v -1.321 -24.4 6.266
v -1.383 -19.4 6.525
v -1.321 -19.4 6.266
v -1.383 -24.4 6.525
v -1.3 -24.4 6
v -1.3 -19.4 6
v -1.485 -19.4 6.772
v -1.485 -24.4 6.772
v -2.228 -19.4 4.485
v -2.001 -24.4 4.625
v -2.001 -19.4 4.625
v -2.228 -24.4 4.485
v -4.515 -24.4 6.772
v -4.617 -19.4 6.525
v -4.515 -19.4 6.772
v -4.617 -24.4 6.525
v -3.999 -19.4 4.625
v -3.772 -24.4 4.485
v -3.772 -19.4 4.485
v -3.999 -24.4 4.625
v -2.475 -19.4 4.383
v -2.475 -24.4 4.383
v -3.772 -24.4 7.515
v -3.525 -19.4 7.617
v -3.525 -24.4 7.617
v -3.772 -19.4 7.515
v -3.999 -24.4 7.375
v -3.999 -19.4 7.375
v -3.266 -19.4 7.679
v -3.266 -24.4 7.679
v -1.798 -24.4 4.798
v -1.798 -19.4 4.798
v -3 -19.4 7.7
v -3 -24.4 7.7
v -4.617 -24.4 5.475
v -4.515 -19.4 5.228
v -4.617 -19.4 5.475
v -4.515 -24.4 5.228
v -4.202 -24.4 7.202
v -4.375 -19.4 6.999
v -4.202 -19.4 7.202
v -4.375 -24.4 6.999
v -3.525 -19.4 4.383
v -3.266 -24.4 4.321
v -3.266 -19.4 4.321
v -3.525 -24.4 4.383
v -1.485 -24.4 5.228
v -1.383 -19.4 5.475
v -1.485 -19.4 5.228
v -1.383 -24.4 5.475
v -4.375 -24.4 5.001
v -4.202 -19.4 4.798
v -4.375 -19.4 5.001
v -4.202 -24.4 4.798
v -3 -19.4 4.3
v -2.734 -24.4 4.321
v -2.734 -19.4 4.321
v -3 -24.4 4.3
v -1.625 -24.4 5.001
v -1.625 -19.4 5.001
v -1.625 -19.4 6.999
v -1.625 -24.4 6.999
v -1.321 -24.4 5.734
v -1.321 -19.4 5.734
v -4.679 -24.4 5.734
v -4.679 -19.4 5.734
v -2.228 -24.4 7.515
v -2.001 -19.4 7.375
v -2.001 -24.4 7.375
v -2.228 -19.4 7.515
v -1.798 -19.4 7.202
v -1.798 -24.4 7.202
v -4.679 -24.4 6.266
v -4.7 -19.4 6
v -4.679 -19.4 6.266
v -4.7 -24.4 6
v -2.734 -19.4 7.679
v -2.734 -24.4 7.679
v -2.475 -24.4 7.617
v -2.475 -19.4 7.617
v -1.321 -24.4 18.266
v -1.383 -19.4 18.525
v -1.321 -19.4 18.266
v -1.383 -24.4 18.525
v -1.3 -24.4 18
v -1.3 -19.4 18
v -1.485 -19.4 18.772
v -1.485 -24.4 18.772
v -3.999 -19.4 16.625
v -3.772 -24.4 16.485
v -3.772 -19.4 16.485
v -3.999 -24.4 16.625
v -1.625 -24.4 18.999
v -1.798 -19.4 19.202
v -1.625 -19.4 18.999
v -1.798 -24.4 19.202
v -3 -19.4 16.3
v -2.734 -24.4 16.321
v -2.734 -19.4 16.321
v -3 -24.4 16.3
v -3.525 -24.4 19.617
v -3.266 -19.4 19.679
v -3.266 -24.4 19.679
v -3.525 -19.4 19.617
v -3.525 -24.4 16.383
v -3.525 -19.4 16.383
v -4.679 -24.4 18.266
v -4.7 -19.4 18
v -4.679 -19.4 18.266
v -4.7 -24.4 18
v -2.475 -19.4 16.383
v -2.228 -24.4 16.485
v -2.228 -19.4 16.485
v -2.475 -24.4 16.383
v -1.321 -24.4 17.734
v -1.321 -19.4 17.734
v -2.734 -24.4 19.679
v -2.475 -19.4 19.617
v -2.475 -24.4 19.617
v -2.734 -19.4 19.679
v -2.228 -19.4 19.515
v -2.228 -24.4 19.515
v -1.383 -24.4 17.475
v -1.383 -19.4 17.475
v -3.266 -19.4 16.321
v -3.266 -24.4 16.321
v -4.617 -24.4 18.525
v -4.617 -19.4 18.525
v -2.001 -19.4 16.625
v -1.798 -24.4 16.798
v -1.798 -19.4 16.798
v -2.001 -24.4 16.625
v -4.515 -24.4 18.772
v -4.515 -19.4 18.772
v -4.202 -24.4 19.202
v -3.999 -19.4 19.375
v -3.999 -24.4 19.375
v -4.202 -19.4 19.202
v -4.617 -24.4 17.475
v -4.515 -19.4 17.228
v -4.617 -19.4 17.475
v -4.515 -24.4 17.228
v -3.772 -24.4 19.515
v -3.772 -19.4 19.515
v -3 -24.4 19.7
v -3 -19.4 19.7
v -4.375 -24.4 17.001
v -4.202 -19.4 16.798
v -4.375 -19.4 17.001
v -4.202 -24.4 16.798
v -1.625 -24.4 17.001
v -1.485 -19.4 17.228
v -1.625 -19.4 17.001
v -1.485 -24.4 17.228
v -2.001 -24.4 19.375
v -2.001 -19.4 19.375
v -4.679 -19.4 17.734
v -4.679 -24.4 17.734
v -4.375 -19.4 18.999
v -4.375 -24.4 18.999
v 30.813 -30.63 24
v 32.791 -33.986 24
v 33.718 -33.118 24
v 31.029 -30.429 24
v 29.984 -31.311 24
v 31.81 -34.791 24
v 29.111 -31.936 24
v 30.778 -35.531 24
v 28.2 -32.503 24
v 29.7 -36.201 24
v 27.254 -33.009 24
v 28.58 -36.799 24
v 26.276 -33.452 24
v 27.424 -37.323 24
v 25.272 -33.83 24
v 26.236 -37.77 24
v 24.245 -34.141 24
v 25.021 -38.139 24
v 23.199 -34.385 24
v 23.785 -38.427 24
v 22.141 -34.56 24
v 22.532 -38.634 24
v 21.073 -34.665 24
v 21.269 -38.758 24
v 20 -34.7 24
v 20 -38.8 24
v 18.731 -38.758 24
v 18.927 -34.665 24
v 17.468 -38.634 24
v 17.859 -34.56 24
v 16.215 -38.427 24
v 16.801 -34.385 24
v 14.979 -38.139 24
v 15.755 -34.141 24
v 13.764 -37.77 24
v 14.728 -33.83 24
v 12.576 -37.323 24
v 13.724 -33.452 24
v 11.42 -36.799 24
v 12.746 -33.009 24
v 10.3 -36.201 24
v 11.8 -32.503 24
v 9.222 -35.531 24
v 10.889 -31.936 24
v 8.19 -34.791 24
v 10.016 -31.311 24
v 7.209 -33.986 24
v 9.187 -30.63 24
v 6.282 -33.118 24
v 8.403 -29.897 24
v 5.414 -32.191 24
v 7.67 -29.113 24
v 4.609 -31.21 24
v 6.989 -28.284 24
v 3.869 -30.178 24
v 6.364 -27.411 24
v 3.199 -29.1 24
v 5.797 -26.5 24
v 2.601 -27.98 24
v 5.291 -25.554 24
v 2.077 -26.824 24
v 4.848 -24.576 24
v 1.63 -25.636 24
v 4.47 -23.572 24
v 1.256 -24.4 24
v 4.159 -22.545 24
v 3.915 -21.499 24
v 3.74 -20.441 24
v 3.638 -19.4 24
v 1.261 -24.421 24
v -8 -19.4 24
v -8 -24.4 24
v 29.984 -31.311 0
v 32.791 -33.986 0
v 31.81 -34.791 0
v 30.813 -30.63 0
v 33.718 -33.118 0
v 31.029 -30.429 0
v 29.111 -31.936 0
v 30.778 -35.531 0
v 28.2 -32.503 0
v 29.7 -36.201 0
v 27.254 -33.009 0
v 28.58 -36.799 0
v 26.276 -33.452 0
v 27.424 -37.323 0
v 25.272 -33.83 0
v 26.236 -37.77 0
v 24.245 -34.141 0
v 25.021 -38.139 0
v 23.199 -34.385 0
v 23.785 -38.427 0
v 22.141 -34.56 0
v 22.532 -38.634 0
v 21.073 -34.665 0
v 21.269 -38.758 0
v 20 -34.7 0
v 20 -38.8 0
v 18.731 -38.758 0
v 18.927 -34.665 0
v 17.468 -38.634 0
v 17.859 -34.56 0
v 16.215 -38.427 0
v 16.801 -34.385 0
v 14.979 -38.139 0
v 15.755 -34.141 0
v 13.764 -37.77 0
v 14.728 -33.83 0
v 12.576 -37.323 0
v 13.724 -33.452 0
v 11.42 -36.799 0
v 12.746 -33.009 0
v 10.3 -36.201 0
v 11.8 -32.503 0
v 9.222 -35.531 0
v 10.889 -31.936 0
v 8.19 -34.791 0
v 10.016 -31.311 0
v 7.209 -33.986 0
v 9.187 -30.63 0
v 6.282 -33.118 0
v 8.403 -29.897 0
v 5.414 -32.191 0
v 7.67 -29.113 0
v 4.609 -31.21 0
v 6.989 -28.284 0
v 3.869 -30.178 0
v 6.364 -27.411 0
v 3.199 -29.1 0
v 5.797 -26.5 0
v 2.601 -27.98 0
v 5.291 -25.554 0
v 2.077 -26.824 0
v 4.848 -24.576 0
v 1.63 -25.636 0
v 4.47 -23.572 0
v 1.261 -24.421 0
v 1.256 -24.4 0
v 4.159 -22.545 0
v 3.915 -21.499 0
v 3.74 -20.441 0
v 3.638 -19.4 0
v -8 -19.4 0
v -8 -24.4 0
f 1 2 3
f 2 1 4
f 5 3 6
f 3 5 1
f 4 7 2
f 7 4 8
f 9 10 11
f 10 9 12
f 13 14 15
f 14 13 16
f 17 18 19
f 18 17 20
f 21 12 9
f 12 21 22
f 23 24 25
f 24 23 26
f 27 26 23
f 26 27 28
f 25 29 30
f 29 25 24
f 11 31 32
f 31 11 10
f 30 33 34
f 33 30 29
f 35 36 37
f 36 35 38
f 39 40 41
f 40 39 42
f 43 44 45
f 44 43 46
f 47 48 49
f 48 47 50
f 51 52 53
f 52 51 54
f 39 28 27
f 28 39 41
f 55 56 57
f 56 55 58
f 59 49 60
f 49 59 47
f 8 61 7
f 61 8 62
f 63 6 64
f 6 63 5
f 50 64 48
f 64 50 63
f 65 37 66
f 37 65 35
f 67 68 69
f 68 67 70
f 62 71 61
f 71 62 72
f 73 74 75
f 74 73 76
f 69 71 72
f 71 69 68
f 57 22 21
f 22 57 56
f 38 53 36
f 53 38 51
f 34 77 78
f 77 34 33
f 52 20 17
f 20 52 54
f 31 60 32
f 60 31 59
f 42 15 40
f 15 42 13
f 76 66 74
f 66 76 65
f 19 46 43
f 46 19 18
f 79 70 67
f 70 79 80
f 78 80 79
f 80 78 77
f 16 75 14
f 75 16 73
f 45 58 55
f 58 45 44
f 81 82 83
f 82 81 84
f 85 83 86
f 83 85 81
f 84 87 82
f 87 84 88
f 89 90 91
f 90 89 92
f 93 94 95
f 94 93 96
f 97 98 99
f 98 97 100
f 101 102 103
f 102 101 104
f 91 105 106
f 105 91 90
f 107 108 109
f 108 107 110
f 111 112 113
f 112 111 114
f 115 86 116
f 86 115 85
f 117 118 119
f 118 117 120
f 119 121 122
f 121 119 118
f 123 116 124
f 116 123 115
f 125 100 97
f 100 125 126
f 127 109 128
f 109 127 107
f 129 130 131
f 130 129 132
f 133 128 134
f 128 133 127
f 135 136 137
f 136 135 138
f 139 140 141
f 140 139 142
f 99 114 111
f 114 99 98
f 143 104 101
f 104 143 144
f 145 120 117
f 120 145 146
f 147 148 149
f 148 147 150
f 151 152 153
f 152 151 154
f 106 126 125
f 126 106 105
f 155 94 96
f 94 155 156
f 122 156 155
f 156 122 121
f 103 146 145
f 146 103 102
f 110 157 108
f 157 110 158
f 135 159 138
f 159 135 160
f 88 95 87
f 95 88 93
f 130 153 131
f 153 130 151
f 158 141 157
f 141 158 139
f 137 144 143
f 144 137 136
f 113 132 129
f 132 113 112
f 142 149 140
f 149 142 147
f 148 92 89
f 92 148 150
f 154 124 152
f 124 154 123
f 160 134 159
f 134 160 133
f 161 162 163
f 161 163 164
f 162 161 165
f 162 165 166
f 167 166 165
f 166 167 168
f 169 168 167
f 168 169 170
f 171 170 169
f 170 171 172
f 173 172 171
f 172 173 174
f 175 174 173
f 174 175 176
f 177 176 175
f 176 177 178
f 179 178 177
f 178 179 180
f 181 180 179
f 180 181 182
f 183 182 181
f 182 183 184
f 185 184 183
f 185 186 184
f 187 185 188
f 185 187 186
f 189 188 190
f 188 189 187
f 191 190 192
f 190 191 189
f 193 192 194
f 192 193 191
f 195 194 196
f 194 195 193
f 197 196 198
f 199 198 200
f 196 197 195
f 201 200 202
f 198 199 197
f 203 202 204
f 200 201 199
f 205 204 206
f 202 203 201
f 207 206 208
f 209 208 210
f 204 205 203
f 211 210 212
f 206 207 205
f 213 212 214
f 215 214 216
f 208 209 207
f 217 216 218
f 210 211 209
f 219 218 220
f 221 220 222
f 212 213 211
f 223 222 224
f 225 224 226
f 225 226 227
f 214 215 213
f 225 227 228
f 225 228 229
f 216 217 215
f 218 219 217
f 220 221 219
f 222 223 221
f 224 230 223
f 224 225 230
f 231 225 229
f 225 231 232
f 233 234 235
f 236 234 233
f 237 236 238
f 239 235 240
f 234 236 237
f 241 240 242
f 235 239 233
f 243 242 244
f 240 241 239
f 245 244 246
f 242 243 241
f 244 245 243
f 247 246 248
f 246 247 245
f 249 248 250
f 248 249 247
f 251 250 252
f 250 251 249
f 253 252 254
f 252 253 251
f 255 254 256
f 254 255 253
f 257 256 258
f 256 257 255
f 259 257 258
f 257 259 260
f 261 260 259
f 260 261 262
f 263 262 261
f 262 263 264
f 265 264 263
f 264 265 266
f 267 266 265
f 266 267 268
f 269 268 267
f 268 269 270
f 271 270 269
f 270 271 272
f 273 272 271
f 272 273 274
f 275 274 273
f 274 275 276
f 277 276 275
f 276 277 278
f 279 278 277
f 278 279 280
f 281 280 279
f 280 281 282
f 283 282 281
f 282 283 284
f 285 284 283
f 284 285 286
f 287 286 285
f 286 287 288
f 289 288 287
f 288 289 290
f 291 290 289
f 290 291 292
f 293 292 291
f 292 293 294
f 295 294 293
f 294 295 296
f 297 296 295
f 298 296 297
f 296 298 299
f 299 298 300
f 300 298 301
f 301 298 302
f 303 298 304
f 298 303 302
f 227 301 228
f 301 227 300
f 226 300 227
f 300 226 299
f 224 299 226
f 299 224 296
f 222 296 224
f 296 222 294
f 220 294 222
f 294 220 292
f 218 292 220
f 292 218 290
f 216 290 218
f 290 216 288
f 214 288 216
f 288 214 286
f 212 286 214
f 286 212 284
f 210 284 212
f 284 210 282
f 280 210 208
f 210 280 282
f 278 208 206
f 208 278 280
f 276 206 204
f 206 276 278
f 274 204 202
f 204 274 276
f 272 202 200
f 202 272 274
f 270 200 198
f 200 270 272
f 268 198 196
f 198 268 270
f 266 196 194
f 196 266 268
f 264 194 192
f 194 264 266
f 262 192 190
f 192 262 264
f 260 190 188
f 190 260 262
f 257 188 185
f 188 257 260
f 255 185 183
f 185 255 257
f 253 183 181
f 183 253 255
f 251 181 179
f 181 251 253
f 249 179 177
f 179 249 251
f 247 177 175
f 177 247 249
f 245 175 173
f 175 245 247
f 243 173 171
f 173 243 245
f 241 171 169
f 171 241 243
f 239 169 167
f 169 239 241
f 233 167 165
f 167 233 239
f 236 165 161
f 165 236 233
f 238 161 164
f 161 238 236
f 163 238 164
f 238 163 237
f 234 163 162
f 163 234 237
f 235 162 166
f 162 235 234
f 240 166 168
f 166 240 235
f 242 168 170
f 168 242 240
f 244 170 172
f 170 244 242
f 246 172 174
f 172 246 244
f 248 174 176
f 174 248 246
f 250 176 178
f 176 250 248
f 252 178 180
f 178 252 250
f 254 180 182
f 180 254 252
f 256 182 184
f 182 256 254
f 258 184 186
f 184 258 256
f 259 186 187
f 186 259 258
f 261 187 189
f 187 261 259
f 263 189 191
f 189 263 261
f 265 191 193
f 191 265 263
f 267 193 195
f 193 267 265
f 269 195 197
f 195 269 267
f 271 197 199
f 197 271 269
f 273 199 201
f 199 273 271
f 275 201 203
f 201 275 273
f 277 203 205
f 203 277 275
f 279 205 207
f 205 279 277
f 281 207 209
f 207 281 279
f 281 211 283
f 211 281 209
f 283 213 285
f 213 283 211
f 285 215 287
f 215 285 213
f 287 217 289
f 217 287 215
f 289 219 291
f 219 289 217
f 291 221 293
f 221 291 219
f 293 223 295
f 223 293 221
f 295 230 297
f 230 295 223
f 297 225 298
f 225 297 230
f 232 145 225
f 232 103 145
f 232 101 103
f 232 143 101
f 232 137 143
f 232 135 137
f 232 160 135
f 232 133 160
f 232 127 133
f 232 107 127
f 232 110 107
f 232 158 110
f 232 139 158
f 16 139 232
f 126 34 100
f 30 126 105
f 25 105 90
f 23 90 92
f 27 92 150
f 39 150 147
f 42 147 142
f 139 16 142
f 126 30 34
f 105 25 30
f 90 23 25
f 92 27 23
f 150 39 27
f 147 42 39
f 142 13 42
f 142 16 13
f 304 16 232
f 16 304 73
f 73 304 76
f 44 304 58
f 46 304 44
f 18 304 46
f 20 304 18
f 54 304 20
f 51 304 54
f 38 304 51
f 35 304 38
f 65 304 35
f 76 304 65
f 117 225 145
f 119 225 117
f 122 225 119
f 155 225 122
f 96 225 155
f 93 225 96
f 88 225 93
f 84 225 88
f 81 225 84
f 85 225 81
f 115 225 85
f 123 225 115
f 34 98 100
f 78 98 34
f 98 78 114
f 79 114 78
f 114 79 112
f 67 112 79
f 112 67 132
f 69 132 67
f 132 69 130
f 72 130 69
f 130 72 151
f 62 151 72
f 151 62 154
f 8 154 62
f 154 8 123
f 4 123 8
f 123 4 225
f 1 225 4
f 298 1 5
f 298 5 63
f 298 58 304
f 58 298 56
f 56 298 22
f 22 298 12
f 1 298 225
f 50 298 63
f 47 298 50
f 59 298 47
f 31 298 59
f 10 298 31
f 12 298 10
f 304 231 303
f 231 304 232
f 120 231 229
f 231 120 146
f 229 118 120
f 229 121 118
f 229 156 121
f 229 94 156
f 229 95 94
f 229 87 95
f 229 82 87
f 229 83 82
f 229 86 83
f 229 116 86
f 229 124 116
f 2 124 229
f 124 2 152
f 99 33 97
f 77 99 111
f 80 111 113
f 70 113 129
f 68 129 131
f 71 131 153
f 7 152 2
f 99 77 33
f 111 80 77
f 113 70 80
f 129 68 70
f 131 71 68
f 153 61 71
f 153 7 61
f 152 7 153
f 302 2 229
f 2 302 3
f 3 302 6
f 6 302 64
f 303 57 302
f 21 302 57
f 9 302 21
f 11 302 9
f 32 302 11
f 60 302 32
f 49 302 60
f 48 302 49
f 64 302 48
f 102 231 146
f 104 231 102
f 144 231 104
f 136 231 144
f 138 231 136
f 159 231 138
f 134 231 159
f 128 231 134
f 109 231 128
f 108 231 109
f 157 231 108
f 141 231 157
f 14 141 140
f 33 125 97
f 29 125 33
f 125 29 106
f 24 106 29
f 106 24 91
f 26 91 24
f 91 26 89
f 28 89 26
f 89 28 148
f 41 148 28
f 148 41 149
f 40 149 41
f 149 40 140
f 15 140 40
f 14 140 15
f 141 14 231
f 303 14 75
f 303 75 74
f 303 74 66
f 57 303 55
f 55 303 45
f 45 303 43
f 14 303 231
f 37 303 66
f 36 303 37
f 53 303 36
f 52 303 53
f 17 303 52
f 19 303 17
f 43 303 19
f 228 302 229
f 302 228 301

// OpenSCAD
include <../lib/apache-case-modules-lib.scad>;
$fn = 40;
hook_print();
